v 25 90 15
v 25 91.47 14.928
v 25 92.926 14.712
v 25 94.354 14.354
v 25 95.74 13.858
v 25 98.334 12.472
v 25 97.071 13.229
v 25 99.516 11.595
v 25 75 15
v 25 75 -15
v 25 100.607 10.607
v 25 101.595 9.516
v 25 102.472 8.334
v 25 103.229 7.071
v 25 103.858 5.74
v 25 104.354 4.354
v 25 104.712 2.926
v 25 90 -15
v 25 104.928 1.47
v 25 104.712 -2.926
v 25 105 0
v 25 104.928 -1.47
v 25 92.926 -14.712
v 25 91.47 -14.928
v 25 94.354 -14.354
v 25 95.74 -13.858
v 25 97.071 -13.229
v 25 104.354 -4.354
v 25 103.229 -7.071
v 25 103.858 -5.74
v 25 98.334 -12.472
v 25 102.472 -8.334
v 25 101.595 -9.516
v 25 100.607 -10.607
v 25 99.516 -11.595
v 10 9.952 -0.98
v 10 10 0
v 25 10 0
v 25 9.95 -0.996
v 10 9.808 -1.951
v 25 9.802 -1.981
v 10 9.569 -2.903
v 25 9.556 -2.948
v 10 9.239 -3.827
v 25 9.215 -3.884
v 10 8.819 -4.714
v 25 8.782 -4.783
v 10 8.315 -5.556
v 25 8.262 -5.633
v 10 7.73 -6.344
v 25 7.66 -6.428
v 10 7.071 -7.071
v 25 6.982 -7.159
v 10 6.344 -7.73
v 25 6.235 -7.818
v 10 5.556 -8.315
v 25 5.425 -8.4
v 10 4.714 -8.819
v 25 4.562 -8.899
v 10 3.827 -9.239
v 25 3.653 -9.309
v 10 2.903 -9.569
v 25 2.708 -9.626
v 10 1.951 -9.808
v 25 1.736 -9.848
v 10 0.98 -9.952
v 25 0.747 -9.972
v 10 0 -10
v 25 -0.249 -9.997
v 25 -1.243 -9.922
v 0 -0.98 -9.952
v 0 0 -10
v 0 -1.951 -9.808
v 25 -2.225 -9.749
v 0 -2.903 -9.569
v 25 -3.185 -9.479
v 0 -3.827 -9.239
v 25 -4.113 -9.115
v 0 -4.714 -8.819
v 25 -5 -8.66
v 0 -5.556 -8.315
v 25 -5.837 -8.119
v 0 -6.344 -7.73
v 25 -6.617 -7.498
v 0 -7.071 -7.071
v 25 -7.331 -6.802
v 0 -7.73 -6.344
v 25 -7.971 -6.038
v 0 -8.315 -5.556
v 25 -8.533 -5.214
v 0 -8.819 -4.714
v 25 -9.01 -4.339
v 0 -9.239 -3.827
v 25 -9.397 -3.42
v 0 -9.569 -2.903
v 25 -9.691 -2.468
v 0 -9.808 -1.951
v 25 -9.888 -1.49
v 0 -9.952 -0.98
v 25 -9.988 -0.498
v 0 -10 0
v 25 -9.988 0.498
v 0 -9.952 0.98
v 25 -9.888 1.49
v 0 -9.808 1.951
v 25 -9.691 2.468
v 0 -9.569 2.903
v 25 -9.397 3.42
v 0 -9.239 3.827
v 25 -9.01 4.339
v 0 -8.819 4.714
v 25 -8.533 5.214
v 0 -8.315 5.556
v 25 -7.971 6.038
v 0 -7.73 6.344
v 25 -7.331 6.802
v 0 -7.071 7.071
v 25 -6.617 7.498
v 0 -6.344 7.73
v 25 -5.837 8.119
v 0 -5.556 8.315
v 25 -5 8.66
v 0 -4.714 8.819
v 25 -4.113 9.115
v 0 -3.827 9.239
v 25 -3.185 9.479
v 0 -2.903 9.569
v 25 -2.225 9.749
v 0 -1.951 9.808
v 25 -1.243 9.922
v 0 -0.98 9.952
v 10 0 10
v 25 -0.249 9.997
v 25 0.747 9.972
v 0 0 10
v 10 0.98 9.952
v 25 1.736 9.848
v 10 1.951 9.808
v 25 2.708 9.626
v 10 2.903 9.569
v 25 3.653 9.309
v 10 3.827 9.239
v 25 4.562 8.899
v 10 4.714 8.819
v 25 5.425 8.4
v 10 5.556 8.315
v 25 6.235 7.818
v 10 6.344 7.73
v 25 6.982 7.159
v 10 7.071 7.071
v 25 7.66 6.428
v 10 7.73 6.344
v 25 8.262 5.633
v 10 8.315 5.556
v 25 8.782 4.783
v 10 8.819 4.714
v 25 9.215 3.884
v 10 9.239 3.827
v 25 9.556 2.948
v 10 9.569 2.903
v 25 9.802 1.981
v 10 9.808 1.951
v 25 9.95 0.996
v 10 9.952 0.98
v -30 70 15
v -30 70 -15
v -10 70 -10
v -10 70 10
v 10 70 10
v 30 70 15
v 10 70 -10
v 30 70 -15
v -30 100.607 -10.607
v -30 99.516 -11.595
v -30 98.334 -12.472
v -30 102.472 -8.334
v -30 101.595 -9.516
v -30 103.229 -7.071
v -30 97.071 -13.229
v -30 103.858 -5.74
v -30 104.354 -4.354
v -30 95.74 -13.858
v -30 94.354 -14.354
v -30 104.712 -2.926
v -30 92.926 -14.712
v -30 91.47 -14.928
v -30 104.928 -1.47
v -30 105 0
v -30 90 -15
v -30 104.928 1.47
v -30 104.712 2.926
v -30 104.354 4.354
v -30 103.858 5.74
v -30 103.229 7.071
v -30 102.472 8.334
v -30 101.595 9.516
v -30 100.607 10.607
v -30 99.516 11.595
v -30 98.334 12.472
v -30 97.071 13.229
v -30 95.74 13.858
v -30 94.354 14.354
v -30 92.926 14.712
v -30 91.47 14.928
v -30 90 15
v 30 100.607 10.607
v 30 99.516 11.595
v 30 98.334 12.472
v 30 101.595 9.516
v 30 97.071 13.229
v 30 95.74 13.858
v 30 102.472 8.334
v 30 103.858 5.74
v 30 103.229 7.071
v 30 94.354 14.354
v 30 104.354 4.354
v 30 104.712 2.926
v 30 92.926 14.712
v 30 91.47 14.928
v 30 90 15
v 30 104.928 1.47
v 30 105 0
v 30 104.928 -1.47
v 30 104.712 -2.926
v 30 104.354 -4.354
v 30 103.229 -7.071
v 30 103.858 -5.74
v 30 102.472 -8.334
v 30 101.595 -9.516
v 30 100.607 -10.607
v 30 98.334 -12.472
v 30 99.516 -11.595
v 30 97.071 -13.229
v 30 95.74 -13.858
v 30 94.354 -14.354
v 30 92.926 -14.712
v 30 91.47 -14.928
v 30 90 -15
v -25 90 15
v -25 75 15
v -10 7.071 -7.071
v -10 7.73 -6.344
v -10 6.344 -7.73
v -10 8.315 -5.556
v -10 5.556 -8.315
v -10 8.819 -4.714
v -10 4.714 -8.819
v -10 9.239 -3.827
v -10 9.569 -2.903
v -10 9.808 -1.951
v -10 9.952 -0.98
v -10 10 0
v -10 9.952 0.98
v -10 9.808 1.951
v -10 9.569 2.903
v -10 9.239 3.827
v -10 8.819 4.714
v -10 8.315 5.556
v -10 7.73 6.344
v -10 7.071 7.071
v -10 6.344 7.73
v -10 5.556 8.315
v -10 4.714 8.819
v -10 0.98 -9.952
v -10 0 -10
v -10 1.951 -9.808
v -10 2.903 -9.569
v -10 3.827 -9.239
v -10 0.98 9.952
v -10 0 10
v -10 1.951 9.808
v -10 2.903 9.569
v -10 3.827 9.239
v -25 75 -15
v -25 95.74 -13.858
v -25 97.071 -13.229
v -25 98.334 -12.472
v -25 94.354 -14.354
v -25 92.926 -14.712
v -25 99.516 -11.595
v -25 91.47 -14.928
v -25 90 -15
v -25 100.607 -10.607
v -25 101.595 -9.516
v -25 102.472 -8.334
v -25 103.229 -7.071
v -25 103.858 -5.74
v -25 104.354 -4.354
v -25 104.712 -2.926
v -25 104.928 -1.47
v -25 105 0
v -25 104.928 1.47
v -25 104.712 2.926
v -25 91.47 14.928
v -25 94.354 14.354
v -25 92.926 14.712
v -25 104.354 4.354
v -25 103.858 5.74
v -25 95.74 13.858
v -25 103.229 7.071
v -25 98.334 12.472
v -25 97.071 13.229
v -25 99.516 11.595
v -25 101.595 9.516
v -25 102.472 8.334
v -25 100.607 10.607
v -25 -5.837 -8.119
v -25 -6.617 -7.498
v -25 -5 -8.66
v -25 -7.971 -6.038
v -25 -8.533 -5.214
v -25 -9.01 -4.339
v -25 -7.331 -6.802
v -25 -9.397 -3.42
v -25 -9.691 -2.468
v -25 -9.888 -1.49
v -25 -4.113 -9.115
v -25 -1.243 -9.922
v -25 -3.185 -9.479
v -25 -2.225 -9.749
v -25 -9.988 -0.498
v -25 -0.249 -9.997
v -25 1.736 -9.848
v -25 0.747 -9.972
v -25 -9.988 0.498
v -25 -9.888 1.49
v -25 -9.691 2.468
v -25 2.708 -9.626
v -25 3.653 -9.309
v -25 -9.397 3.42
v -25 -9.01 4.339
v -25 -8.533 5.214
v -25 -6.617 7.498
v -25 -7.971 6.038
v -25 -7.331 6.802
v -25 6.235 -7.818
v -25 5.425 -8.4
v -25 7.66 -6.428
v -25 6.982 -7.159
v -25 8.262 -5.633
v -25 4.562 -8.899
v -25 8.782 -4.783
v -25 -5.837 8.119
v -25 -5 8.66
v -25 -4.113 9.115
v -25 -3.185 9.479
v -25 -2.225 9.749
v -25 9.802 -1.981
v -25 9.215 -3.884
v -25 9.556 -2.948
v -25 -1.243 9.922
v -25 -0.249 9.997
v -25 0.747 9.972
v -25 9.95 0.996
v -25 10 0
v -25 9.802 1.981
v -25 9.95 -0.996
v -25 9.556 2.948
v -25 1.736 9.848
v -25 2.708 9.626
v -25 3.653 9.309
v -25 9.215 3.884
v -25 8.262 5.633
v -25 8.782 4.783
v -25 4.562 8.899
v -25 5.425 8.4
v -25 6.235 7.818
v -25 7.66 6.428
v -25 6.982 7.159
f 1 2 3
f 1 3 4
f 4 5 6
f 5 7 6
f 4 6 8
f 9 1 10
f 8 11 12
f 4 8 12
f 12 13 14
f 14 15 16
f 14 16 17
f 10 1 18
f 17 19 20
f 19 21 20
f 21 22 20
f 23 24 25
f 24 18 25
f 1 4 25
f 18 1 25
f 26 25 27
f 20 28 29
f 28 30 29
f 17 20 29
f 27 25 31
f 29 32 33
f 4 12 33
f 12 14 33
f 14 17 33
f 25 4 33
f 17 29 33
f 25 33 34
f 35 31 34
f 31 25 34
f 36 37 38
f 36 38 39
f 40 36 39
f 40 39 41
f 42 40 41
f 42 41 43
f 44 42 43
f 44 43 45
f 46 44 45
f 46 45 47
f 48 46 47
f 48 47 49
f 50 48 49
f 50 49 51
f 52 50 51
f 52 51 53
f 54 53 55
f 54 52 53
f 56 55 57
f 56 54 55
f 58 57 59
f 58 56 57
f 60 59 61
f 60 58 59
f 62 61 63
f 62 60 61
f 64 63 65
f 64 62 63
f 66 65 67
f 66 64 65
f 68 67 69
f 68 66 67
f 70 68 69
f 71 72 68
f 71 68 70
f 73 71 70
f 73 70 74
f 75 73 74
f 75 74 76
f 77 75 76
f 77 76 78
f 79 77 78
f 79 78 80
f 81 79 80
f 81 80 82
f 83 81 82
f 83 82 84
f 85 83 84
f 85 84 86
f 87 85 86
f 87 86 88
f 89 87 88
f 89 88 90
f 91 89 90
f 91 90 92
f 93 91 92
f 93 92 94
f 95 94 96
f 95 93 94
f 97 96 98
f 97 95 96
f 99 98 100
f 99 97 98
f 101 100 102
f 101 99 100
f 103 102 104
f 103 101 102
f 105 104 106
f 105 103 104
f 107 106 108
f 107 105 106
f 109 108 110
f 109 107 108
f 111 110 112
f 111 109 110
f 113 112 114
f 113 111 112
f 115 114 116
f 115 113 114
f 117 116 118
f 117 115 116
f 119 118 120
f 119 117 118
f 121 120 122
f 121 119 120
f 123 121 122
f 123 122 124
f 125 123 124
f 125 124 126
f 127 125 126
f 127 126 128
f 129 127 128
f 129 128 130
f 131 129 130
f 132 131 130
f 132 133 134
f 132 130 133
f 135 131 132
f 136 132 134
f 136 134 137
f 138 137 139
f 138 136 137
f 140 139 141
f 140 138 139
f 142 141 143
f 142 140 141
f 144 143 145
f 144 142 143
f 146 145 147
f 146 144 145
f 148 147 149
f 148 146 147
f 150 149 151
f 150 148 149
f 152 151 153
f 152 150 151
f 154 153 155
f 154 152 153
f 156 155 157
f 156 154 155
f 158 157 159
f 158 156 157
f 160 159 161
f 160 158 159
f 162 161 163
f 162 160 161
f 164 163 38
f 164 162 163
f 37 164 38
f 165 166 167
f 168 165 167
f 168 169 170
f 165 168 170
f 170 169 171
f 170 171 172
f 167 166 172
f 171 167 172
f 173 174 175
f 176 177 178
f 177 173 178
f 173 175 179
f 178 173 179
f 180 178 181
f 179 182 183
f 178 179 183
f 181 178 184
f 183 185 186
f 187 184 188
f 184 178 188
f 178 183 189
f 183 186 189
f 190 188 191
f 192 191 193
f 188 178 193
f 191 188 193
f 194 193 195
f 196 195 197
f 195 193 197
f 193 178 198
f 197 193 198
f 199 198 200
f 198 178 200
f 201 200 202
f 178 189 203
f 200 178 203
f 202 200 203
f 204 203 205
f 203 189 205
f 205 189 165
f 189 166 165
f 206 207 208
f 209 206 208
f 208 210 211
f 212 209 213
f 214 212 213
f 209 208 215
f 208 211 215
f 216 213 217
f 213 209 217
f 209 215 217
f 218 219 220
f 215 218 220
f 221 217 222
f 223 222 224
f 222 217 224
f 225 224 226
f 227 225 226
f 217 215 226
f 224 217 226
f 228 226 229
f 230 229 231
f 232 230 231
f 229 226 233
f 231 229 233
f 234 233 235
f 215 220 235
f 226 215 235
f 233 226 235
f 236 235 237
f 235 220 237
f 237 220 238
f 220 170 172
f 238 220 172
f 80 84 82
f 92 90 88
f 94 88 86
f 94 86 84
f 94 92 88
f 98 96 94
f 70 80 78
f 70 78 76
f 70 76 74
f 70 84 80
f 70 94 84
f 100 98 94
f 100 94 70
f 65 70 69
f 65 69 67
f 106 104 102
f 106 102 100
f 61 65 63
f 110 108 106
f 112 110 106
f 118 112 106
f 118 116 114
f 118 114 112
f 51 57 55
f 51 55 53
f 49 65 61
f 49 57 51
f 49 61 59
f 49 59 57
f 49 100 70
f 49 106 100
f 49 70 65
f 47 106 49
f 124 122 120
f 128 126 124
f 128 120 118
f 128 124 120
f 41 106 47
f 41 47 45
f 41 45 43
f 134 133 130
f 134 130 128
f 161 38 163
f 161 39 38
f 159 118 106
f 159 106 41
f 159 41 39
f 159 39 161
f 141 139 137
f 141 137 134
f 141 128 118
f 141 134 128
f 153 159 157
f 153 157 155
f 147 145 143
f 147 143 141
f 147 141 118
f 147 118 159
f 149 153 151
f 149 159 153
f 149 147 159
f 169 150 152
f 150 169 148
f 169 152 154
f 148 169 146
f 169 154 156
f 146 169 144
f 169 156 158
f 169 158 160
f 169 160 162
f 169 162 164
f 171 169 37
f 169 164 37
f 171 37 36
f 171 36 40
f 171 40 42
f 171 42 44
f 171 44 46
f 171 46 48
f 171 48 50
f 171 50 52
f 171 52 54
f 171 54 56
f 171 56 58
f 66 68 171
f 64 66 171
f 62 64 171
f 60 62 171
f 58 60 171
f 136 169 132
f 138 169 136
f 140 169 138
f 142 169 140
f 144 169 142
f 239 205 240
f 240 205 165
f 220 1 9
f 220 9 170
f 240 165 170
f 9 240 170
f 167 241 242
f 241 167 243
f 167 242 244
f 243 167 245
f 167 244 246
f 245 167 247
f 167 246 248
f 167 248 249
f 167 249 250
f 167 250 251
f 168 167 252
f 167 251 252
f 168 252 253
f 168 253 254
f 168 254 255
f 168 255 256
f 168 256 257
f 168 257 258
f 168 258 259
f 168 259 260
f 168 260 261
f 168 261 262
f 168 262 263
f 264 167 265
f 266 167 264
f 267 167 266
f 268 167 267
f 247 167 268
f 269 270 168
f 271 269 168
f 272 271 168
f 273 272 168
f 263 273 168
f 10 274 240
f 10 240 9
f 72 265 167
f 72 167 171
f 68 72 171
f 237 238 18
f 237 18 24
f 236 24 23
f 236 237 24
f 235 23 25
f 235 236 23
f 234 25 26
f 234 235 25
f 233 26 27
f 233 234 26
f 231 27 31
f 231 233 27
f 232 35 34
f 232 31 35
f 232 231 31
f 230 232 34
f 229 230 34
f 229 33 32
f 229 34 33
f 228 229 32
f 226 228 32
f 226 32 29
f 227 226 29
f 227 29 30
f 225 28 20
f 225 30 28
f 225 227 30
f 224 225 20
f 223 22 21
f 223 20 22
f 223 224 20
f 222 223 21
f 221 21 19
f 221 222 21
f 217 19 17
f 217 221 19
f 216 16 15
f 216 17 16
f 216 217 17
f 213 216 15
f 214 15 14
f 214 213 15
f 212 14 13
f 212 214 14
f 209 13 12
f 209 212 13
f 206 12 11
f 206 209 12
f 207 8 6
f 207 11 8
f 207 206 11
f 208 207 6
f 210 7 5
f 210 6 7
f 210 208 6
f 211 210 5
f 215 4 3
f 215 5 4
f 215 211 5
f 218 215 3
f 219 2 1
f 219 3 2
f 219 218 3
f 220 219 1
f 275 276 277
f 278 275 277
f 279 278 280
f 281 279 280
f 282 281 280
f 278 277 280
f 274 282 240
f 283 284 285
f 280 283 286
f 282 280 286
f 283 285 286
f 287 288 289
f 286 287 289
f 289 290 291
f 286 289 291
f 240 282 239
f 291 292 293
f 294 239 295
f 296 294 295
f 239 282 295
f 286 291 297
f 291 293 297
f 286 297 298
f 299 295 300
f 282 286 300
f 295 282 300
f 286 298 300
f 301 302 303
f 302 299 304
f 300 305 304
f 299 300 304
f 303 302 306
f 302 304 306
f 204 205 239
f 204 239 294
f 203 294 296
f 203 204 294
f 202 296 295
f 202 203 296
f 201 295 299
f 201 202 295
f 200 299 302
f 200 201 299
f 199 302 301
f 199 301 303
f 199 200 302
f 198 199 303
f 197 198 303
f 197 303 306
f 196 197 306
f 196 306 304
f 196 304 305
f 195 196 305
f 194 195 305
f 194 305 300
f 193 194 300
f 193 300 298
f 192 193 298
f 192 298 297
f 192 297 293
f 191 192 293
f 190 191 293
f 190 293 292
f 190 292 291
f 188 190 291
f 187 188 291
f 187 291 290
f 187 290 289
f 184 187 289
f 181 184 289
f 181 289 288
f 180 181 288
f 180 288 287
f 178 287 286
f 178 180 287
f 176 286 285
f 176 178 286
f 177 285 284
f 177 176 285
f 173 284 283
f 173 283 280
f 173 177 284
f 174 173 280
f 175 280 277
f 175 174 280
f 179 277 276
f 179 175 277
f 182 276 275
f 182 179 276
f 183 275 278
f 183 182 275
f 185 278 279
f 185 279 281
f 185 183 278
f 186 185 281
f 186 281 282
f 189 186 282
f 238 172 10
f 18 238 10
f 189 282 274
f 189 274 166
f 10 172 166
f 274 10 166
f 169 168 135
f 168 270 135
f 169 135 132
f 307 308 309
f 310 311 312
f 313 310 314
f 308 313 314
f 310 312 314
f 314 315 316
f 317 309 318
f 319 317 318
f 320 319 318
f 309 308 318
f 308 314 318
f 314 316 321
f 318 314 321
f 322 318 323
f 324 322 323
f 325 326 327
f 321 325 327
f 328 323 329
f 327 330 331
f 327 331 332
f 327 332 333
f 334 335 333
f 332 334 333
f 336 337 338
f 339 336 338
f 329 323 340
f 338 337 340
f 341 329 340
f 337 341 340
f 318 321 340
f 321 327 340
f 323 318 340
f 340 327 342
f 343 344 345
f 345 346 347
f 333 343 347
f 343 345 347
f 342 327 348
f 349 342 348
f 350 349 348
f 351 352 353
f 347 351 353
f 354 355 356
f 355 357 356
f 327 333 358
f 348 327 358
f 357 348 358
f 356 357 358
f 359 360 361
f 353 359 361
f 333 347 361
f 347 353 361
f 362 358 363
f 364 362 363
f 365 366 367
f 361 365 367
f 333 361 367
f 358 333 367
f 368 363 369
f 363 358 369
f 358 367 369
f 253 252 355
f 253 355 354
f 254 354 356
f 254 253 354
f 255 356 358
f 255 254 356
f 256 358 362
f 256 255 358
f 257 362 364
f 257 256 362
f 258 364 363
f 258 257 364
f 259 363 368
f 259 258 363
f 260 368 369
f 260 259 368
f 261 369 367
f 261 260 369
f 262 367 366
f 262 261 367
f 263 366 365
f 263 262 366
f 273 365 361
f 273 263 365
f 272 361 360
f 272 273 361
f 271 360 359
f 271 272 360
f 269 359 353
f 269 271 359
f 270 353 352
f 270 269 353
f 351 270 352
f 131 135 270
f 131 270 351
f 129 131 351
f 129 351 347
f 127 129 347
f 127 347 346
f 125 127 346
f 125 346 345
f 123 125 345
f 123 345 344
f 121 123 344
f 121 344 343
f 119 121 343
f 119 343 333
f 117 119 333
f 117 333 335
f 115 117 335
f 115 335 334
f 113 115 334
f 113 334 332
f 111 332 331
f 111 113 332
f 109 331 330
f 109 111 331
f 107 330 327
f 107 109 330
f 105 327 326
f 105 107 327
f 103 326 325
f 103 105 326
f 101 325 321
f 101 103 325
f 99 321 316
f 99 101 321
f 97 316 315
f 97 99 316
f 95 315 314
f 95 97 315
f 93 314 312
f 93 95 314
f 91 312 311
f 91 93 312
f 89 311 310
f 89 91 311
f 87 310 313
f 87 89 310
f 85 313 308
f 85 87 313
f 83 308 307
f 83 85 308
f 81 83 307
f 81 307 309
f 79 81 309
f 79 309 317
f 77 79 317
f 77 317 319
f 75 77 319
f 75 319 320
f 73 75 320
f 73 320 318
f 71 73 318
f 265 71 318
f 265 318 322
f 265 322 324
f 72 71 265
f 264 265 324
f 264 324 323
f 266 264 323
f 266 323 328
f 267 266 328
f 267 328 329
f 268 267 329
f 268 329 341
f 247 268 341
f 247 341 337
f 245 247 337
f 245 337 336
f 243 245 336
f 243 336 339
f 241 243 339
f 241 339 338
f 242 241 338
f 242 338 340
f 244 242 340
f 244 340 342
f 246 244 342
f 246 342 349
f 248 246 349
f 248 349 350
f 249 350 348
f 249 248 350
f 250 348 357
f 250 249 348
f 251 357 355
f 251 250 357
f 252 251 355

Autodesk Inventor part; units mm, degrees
ref_plane "YZ Plane" through (0, 0, 0) normal (1, 0, 0) x (0, 1, 0)
ref_plane "XZ Plane" through (0, 0, 0) normal (0, 1, 0) x (-1, 0, 0)
ref_plane "XY Plane" through (0, 0, 0) normal (0, 0, 1) x (1, 0, 0)
sketch "스케치7" plane through (0, 0, 0) normal (1, 0, 0) x (0, 1, 0)
  circle A0 centre (0, 0) radius 10
  dimension "d29" = 20
extrude "돌출7" add sketch "스케치7" along normal mid plane 50
sketch "스케치8" plane through (0, 0, 0) normal (0, 1, 0) x (-1, 0, 0)
  line L0 (25, 10) -> (-25, 10) projected
  line L1 (25, -10) -> (-25, -10) projected
  line L2 (10, 10) -> (-10, 10)
  line L3 (-10, 10) -> (-10, -10)
  line L4 (-10, -10) -> (10, -10)
  line L5 (10, -10) -> (10, 10)
  line L6 (25, -10) -> (25, 10) projected
  point P0 (0, 0)
  dimension "d32" = 20
  dimension "d33" = 15
extrude "돌출8" add sketch "스케치8" along normal blind 70 contours L5 L1 L3 L0
sketch "스케치9" plane through (0, 70, 0) normal (0, 1, 0) x (1, 0, 0)
  line L0 (-30, -15) -> (30, -15)
  line L1 (30, -15) -> (30, 15)
  line L2 (30, 15) -> (-30, 15)
  line L3 (-30, 15) -> (-30, -15)
  line L4 (-30, -15) -> (30, 15) construction
  line L5 (30, -15) -> (-30, 15) construction
  point P0 (0, 0)
  dimension "d36" = 60
  dimension "d37" = 30
extrude "돌출9" add sketch "스케치9" along normal blind 5
sketch "스케치10" plane through (-30, 70, -15) normal (-1, 0, 0) x (0, 0, 1)
  line L0 (0, 5) -> (30, 5)
  line L1 (30, 5) -> (30, 20)
  line L2 (30, 20) -> (0, 20)
  line L3 (0, 20) -> (0, 5)
  arc A0 (30, 20) -> (0, 20) centre (15, 20) ccw
  point P0 (15, -70)
  dimension "d40" = 30
  dimension "d41" = 15
extrude "돌출10" add sketch "스케치10" against normal blind 5
mirror "미러3" about plane through (0, 0, 0) normal (1, 0, 0) of "돌출10"
properties part number "L2_0.1" material "ABS 플라스틱"
